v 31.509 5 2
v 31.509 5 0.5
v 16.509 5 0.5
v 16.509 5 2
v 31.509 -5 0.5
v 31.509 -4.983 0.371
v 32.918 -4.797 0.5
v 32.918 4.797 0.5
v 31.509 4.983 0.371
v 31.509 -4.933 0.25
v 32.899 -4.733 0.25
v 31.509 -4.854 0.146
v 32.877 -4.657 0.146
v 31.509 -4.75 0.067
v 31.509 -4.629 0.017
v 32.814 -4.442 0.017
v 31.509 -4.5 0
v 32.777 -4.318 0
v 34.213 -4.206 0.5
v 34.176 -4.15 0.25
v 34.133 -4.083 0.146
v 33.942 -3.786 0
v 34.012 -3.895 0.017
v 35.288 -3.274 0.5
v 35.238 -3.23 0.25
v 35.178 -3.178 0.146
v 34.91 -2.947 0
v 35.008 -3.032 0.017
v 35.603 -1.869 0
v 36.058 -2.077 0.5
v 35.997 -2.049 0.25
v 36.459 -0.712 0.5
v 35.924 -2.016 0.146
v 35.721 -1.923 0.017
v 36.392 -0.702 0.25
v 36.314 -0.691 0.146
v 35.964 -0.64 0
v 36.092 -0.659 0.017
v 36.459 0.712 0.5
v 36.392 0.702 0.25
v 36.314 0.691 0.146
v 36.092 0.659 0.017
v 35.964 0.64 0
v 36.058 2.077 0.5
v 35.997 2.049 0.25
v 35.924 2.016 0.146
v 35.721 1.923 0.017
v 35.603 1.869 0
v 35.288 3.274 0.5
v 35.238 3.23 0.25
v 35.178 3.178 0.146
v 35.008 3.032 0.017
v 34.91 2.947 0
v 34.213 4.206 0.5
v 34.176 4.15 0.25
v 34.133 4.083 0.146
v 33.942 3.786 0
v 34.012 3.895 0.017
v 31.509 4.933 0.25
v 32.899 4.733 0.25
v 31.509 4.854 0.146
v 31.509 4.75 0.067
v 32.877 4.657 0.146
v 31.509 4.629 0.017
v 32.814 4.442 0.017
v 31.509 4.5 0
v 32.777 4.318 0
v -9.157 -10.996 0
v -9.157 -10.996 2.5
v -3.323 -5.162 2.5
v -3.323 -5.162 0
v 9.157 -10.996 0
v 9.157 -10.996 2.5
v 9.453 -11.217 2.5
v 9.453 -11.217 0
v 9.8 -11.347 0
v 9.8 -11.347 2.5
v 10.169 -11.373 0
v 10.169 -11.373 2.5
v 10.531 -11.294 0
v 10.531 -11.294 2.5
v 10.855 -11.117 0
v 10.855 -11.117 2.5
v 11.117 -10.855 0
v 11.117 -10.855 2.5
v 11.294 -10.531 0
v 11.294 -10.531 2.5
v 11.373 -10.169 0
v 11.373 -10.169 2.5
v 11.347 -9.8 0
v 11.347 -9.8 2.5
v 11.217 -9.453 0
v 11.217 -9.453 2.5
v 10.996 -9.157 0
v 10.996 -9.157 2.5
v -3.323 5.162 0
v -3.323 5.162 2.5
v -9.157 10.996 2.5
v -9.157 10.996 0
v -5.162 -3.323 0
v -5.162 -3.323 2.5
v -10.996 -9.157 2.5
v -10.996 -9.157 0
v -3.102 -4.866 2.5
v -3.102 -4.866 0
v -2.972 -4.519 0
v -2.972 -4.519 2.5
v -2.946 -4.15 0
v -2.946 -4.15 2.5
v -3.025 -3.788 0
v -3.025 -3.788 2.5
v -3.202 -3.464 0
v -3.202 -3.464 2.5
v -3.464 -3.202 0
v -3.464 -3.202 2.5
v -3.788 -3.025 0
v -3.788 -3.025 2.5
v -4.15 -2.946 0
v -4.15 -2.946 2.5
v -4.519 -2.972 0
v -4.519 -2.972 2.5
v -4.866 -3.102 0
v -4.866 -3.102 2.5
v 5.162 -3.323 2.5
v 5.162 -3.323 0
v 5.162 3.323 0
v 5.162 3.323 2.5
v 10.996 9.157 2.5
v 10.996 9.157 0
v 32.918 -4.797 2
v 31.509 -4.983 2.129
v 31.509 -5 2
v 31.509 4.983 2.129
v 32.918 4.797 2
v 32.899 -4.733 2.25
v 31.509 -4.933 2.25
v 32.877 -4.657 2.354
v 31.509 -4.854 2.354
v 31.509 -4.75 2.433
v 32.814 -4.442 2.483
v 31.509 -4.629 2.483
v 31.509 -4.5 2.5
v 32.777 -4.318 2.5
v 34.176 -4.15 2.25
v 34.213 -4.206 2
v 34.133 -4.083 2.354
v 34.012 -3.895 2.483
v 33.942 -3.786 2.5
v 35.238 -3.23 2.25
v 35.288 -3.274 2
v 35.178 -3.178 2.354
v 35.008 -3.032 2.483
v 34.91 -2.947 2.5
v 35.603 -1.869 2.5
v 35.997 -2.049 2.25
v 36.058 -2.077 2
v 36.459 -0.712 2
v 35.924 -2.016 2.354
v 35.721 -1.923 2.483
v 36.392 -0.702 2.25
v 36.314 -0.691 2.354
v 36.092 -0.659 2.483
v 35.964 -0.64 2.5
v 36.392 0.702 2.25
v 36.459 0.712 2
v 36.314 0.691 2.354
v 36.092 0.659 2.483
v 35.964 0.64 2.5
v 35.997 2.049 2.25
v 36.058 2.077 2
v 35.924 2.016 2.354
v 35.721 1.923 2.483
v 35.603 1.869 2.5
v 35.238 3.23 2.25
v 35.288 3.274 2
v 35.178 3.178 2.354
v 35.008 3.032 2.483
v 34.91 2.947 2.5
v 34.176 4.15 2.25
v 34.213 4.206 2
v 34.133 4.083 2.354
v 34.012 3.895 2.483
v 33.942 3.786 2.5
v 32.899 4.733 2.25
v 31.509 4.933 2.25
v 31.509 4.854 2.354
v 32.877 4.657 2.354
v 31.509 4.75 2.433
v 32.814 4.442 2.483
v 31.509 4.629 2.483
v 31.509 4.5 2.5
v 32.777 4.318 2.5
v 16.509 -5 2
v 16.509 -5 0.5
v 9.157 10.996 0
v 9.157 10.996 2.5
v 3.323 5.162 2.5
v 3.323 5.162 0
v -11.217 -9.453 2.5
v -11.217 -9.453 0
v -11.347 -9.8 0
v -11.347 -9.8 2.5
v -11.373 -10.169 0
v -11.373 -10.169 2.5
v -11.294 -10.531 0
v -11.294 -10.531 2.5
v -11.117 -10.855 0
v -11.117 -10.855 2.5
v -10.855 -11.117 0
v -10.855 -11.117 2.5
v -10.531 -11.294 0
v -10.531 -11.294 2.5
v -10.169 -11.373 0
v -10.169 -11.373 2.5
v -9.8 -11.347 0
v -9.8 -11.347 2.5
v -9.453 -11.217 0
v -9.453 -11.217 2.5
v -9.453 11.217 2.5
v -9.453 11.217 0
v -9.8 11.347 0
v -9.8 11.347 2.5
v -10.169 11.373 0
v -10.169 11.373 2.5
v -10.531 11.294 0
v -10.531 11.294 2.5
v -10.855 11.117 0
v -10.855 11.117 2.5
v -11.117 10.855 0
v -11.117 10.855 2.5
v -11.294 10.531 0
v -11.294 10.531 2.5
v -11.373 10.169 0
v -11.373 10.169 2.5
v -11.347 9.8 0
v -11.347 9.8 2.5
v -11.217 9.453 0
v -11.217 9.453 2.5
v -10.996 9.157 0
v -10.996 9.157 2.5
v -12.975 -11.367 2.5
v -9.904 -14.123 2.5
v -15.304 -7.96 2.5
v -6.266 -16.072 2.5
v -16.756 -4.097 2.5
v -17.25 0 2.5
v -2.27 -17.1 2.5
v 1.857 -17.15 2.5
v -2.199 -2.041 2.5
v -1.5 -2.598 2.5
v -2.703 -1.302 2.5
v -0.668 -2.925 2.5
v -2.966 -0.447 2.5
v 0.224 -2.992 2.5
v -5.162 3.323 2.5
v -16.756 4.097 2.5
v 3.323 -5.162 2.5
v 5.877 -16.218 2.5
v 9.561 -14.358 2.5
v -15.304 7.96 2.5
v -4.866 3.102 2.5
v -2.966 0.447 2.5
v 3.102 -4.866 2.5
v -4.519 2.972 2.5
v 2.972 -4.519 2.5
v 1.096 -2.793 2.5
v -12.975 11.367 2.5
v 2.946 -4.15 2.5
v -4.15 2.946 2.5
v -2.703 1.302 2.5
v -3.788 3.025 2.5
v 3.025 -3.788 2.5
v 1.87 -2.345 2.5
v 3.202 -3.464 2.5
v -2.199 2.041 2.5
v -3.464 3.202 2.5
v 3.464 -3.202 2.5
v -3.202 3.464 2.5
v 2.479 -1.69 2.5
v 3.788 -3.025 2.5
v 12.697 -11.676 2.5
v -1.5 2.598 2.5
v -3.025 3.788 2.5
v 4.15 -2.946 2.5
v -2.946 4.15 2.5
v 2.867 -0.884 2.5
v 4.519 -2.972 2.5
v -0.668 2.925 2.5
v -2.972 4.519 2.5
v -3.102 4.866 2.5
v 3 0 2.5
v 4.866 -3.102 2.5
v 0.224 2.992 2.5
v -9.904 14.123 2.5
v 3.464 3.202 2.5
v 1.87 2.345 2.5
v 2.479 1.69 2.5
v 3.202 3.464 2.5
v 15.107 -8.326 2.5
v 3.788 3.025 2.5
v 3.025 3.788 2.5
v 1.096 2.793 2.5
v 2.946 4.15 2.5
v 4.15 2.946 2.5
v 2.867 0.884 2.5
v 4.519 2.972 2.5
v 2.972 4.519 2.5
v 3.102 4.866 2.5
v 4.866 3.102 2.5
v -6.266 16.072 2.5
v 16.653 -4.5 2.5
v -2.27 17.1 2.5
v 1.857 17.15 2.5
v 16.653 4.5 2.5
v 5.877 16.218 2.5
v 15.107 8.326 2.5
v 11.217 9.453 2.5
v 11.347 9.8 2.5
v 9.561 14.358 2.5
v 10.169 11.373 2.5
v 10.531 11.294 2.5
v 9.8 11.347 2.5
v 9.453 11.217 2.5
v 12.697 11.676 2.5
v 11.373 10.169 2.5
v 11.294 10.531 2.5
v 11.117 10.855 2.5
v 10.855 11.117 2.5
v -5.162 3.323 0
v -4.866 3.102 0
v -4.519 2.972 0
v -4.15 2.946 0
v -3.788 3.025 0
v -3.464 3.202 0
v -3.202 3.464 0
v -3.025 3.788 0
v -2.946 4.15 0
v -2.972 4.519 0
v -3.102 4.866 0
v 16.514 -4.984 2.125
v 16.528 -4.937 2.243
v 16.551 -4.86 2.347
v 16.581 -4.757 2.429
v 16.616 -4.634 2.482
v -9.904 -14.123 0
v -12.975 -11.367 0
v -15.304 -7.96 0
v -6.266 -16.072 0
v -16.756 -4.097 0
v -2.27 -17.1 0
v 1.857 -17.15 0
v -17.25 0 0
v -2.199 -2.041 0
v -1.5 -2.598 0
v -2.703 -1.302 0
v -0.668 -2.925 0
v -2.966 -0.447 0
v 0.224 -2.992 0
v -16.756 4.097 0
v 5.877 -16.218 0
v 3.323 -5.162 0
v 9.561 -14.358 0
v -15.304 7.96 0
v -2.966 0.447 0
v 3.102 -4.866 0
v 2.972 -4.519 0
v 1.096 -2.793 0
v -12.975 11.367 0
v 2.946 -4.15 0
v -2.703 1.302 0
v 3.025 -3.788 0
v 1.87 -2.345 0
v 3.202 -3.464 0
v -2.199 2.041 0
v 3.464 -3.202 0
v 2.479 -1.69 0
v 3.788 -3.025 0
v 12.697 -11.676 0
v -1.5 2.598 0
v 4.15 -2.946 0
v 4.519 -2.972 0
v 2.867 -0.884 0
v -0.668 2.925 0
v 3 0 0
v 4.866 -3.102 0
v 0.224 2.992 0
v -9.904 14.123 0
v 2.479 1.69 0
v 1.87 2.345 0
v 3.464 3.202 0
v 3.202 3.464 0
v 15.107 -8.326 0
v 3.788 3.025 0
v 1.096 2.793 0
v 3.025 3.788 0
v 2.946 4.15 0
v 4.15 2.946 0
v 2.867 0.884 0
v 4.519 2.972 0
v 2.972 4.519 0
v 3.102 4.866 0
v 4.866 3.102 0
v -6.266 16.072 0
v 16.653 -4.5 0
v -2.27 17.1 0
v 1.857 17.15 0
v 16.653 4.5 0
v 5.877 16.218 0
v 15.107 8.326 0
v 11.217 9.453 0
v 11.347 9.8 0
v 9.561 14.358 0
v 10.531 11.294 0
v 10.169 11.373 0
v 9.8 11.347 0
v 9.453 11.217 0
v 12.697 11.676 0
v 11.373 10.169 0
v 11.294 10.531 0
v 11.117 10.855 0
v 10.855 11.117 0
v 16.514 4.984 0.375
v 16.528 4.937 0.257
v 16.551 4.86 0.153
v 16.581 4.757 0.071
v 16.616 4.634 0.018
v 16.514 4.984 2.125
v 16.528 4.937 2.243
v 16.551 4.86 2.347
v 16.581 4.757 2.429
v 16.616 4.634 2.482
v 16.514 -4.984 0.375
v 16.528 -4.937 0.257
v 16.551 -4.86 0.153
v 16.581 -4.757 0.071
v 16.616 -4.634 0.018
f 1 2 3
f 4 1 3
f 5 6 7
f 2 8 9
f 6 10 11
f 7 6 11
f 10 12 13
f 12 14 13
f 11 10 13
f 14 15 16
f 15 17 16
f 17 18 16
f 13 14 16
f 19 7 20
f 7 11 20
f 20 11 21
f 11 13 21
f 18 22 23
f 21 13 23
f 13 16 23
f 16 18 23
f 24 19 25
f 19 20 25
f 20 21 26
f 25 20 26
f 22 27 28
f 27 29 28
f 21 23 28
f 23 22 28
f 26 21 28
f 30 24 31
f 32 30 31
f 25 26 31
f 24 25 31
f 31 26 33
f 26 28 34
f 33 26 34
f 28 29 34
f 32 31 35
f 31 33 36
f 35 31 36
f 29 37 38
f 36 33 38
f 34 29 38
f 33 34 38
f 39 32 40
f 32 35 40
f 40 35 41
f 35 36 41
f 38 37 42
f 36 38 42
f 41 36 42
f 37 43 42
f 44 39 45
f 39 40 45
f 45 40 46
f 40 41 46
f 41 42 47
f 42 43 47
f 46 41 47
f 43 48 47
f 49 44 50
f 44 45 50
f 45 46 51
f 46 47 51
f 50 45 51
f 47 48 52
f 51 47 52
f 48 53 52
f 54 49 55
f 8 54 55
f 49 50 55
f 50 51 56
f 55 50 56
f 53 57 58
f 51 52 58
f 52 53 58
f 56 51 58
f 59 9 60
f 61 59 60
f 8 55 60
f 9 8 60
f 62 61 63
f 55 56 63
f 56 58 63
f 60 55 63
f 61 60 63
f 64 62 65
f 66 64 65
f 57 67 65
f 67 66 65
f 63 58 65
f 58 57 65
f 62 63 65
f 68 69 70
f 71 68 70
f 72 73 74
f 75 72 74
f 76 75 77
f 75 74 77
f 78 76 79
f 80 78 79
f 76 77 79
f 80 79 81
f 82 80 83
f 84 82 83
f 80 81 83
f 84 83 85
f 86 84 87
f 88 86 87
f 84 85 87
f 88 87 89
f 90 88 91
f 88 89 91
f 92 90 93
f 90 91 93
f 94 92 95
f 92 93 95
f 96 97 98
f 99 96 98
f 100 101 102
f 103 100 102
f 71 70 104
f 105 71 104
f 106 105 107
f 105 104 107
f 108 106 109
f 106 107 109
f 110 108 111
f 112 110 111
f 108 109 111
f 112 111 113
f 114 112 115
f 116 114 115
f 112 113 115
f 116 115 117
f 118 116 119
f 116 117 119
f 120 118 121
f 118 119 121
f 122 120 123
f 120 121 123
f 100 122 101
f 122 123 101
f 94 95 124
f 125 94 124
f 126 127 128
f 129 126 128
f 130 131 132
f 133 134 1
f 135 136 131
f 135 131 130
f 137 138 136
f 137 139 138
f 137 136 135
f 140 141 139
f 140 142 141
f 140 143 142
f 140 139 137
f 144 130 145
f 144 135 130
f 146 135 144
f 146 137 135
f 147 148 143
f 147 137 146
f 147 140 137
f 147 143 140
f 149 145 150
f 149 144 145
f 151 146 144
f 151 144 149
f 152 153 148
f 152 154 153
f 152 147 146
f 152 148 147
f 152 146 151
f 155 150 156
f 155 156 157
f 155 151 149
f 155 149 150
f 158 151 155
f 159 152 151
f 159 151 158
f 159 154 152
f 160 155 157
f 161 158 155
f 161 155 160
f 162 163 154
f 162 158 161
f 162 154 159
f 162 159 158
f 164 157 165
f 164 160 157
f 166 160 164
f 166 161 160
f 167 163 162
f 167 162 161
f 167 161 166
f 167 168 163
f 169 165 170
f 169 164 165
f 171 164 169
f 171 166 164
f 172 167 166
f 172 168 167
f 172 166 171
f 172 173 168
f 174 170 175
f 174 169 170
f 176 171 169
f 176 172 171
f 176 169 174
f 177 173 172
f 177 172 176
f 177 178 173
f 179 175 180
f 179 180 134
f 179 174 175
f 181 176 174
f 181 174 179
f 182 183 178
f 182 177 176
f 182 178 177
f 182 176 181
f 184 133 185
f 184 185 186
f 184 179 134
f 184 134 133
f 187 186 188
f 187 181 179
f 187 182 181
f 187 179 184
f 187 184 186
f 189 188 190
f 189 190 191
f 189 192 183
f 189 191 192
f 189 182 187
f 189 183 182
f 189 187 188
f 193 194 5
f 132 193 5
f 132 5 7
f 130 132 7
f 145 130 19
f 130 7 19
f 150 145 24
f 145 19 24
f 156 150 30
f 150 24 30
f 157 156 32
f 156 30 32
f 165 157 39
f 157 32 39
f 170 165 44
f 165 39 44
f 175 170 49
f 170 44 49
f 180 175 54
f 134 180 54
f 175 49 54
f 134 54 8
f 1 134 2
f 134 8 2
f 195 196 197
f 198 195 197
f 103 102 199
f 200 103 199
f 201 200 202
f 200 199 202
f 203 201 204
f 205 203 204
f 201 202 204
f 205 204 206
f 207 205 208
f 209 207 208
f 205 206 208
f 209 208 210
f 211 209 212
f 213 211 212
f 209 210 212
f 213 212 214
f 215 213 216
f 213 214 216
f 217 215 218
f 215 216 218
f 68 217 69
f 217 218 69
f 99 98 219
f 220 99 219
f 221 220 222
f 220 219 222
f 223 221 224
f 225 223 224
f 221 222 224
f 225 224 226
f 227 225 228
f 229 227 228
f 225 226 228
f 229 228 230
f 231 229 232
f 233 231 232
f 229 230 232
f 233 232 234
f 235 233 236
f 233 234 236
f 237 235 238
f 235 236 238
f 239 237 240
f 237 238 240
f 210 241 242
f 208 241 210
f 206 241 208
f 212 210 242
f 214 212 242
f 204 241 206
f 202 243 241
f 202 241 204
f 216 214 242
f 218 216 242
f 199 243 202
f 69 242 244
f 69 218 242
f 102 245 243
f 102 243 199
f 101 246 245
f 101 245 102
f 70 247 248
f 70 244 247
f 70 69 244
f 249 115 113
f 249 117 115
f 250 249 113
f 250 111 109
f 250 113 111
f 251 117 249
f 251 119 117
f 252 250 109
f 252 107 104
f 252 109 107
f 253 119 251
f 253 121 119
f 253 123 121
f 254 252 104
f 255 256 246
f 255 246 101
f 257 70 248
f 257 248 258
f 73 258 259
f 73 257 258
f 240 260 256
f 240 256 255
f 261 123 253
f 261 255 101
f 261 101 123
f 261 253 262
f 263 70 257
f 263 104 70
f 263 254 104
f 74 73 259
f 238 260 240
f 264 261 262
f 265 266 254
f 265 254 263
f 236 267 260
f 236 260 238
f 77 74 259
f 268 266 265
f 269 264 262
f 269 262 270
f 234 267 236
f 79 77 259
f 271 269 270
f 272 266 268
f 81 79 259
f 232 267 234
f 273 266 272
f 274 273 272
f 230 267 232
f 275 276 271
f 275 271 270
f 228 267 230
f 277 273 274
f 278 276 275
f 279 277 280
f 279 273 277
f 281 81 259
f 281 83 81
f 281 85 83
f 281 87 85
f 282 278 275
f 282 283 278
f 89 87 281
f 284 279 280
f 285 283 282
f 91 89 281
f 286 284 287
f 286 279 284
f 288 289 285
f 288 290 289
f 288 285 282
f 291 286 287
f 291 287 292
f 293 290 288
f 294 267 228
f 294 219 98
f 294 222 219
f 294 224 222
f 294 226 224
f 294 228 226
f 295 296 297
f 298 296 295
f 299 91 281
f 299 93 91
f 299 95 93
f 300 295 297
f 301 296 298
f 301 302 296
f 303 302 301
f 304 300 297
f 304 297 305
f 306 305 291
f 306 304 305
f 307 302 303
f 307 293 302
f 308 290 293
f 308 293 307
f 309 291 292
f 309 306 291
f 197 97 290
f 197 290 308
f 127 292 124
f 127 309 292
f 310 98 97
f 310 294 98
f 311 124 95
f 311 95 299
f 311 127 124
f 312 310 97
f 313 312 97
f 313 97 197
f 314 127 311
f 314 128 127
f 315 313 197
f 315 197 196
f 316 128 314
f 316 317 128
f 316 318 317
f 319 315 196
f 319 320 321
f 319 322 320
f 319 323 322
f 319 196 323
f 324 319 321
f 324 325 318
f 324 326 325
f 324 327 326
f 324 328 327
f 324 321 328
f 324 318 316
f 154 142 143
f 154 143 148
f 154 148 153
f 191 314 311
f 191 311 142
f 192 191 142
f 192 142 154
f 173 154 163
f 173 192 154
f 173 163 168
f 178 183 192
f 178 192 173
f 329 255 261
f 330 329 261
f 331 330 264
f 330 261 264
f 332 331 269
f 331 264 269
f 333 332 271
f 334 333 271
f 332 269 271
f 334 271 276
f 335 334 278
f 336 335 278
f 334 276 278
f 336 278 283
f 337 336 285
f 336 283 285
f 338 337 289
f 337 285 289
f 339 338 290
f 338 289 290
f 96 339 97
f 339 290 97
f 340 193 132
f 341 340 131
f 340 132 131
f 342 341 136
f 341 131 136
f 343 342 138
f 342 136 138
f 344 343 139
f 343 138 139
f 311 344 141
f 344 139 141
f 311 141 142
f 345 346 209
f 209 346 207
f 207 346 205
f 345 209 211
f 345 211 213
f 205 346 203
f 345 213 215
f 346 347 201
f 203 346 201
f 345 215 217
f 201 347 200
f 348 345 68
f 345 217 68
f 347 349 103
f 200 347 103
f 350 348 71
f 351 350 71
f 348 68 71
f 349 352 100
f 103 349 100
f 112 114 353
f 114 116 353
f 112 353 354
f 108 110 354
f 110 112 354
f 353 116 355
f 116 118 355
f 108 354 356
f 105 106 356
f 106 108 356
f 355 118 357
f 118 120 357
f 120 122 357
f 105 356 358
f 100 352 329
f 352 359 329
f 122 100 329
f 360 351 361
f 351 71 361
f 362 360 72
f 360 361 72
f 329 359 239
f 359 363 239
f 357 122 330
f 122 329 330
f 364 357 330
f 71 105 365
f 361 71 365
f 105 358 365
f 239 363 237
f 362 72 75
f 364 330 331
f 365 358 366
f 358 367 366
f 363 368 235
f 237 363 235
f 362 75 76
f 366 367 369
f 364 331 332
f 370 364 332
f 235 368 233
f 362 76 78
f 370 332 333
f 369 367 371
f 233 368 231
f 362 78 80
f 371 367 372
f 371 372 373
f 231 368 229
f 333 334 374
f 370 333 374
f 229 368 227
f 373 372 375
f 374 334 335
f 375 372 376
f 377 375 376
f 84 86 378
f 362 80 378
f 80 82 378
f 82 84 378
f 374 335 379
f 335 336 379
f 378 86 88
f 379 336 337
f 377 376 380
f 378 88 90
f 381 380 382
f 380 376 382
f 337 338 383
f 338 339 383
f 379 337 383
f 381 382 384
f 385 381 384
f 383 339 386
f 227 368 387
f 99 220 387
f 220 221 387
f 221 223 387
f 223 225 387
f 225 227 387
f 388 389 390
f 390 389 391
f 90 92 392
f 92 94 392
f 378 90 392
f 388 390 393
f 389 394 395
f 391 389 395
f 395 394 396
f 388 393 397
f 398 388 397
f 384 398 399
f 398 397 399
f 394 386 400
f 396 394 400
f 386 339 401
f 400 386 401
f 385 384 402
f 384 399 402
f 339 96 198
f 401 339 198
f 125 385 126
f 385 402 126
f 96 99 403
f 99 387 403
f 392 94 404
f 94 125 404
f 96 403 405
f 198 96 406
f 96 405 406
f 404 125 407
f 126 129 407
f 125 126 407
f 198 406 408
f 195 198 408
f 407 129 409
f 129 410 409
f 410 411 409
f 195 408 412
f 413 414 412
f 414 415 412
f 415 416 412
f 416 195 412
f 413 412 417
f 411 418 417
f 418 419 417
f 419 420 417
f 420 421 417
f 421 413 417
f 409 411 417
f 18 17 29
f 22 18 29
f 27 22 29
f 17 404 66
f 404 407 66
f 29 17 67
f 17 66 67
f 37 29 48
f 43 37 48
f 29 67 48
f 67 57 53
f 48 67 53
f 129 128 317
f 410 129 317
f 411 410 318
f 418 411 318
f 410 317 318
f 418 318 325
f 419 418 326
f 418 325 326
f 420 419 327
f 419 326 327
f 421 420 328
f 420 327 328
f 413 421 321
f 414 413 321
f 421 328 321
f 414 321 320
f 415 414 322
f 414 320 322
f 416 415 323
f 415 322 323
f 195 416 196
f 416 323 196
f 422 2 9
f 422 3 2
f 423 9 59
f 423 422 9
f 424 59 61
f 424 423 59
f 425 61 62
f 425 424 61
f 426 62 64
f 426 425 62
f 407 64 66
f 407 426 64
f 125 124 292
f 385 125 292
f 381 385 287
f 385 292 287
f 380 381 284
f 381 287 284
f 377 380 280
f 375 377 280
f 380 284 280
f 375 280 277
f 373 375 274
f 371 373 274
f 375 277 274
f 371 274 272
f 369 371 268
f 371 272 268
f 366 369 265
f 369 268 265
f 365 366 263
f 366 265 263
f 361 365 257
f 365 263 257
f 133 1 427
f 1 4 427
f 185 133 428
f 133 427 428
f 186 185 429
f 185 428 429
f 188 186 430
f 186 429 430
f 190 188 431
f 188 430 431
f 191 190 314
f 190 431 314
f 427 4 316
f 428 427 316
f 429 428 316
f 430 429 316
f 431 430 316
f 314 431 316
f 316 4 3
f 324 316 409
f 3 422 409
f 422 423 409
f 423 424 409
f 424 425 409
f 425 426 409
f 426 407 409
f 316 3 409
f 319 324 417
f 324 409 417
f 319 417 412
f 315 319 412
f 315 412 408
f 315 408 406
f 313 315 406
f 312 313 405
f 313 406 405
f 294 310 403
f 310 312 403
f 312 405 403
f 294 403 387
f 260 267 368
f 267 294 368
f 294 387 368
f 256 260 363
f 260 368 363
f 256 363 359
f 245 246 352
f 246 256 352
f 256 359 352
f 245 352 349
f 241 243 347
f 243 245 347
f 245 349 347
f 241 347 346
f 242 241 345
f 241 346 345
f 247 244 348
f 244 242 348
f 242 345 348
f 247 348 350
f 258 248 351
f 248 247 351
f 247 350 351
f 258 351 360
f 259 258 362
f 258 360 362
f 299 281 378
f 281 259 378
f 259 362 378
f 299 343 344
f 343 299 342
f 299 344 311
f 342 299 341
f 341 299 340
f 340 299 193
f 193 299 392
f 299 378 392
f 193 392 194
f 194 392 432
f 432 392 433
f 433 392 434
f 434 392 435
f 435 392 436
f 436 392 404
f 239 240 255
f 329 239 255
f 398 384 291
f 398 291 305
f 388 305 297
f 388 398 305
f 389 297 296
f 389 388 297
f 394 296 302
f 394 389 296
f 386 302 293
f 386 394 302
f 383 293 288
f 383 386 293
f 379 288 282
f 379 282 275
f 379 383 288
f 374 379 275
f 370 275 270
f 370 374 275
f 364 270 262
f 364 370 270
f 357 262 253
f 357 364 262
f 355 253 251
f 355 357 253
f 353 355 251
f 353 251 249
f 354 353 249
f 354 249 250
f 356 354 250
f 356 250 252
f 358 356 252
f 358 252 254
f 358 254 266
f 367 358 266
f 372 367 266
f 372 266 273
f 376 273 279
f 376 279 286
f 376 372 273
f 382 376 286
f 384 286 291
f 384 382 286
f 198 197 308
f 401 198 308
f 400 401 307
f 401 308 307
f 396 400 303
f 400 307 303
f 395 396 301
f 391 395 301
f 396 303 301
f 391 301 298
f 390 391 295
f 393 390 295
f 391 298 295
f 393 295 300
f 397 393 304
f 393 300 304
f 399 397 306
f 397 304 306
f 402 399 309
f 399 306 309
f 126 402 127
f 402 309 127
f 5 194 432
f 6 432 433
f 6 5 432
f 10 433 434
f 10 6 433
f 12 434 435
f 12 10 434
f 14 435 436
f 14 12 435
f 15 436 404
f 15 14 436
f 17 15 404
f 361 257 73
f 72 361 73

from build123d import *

# Parameters (mm, degrees)
SKETCH_R           = 3
PAD_DEPTH          = 2.5
POCKET_DEPTH       = 5
POLARPATTERN_COUNT = 4
FILLET_R           = 0.5


with BuildPart() as part:
    # Sketch → Pad (new body)
    with BuildSketch(Plane.XY):
        with BuildLine():
            ThreePointArc((16.509467, 5), (-17.25, 0), (16.509467, -5))
            Line((16.509467, -5), (31.509467, -5))
            ThreePointArc((31.509467, -5), (36.509467, 0), (31.509467, 5))
            Line((31.509467, 5), (16.509467, 5))
        make_face()
        Circle(SKETCH_R, mode=Mode.SUBTRACT)
    extrude(amount=PAD_DEPTH)

    # Sketch001 (on Face7 of Pad) → Pocket (cut)
    with BuildSketch(Plane.XY.offset(2.5)):
        with BuildLine():
            ThreePointArc((3.323402, 5.16188), (3.323402, 3.323402), (5.16188, 3.323402))
            Line((5.16188, 3.323402), (10.99551, 9.157033))
            ThreePointArc((10.99551, 9.157033), (10.99551, 10.99551), (9.157033, 10.99551))
            Line((9.157033, 10.99551), (3.323402, 5.16188))
        make_face()
    pocket = extrude(amount=-POCKET_DEPTH, mode=Mode.SUBTRACT)

    # PolarPattern: Pocket ×4 about axis
    polarpattern_axis = Axis((0, 0, 2.5), (0, 0, 1))
    for i in range(1, POLARPATTERN_COUNT):
        add(pocket.rotate(polarpattern_axis, i * 360 / POLARPATTERN_COUNT), mode=Mode.SUBTRACT)

    # Fillet
    fillet_edges = [part.edges().sort_by_distance(p)[0] for p in [
        (24.009467, 5, 2.5),
        (36.509467, 0, 2.5),
        (24.009467, -5, 2.5),
        (24.009467, -5, 0),
        (36.509467, 0, 0),
        (24.009467, 5, 0),
    ]]
    fillet(fillet_edges, radius=FILLET_R)


solid = part.part
